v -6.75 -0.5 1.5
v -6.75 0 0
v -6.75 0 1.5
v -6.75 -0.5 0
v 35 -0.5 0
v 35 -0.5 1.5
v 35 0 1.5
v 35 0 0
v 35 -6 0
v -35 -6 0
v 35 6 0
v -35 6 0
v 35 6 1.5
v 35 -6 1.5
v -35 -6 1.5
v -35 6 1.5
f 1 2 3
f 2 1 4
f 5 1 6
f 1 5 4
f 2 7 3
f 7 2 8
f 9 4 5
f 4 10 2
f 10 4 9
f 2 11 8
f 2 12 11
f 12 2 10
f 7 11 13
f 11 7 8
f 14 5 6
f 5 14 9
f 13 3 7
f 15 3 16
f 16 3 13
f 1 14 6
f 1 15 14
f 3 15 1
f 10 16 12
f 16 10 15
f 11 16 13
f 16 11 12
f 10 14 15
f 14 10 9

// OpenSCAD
// 10-well comb for agarose gel casting
// Print orientation: flat on bed, teeth pointing down (-Z)

// ---- Parameters ----
plate_len    = 70;    // spine length (X)
plate_wid    = 12;    // spine width (Y)
plate_thk    = 1.5;   // plate thickness (Z)
tooth_count  = 10;    // number of wells
tooth_w      = 5.0;   // tooth width (X)
tooth_len    = 12;    // tooth length (Y)
gap          = 1.5;   // tooth gap (X)
eps          = 0.5;   // cutter overshoot

$fn = 64;

// ---- Derived ----
pitch   = tooth_w + gap;
x_start = -(tooth_count - 1) * gap / 2;

// ---- Model ----
difference() {
    translate([-plate_len/2, -plate_wid/2, 0])
        cube([plate_len, plate_wid, plate_thk]);
    for (i = [0 : tooth_count - 1])
        translate([x_start + i * pitch, 0, 0])
            rotate([90, 0, 0])
                cube([tooth_len, tooth_w, eps]);
}
